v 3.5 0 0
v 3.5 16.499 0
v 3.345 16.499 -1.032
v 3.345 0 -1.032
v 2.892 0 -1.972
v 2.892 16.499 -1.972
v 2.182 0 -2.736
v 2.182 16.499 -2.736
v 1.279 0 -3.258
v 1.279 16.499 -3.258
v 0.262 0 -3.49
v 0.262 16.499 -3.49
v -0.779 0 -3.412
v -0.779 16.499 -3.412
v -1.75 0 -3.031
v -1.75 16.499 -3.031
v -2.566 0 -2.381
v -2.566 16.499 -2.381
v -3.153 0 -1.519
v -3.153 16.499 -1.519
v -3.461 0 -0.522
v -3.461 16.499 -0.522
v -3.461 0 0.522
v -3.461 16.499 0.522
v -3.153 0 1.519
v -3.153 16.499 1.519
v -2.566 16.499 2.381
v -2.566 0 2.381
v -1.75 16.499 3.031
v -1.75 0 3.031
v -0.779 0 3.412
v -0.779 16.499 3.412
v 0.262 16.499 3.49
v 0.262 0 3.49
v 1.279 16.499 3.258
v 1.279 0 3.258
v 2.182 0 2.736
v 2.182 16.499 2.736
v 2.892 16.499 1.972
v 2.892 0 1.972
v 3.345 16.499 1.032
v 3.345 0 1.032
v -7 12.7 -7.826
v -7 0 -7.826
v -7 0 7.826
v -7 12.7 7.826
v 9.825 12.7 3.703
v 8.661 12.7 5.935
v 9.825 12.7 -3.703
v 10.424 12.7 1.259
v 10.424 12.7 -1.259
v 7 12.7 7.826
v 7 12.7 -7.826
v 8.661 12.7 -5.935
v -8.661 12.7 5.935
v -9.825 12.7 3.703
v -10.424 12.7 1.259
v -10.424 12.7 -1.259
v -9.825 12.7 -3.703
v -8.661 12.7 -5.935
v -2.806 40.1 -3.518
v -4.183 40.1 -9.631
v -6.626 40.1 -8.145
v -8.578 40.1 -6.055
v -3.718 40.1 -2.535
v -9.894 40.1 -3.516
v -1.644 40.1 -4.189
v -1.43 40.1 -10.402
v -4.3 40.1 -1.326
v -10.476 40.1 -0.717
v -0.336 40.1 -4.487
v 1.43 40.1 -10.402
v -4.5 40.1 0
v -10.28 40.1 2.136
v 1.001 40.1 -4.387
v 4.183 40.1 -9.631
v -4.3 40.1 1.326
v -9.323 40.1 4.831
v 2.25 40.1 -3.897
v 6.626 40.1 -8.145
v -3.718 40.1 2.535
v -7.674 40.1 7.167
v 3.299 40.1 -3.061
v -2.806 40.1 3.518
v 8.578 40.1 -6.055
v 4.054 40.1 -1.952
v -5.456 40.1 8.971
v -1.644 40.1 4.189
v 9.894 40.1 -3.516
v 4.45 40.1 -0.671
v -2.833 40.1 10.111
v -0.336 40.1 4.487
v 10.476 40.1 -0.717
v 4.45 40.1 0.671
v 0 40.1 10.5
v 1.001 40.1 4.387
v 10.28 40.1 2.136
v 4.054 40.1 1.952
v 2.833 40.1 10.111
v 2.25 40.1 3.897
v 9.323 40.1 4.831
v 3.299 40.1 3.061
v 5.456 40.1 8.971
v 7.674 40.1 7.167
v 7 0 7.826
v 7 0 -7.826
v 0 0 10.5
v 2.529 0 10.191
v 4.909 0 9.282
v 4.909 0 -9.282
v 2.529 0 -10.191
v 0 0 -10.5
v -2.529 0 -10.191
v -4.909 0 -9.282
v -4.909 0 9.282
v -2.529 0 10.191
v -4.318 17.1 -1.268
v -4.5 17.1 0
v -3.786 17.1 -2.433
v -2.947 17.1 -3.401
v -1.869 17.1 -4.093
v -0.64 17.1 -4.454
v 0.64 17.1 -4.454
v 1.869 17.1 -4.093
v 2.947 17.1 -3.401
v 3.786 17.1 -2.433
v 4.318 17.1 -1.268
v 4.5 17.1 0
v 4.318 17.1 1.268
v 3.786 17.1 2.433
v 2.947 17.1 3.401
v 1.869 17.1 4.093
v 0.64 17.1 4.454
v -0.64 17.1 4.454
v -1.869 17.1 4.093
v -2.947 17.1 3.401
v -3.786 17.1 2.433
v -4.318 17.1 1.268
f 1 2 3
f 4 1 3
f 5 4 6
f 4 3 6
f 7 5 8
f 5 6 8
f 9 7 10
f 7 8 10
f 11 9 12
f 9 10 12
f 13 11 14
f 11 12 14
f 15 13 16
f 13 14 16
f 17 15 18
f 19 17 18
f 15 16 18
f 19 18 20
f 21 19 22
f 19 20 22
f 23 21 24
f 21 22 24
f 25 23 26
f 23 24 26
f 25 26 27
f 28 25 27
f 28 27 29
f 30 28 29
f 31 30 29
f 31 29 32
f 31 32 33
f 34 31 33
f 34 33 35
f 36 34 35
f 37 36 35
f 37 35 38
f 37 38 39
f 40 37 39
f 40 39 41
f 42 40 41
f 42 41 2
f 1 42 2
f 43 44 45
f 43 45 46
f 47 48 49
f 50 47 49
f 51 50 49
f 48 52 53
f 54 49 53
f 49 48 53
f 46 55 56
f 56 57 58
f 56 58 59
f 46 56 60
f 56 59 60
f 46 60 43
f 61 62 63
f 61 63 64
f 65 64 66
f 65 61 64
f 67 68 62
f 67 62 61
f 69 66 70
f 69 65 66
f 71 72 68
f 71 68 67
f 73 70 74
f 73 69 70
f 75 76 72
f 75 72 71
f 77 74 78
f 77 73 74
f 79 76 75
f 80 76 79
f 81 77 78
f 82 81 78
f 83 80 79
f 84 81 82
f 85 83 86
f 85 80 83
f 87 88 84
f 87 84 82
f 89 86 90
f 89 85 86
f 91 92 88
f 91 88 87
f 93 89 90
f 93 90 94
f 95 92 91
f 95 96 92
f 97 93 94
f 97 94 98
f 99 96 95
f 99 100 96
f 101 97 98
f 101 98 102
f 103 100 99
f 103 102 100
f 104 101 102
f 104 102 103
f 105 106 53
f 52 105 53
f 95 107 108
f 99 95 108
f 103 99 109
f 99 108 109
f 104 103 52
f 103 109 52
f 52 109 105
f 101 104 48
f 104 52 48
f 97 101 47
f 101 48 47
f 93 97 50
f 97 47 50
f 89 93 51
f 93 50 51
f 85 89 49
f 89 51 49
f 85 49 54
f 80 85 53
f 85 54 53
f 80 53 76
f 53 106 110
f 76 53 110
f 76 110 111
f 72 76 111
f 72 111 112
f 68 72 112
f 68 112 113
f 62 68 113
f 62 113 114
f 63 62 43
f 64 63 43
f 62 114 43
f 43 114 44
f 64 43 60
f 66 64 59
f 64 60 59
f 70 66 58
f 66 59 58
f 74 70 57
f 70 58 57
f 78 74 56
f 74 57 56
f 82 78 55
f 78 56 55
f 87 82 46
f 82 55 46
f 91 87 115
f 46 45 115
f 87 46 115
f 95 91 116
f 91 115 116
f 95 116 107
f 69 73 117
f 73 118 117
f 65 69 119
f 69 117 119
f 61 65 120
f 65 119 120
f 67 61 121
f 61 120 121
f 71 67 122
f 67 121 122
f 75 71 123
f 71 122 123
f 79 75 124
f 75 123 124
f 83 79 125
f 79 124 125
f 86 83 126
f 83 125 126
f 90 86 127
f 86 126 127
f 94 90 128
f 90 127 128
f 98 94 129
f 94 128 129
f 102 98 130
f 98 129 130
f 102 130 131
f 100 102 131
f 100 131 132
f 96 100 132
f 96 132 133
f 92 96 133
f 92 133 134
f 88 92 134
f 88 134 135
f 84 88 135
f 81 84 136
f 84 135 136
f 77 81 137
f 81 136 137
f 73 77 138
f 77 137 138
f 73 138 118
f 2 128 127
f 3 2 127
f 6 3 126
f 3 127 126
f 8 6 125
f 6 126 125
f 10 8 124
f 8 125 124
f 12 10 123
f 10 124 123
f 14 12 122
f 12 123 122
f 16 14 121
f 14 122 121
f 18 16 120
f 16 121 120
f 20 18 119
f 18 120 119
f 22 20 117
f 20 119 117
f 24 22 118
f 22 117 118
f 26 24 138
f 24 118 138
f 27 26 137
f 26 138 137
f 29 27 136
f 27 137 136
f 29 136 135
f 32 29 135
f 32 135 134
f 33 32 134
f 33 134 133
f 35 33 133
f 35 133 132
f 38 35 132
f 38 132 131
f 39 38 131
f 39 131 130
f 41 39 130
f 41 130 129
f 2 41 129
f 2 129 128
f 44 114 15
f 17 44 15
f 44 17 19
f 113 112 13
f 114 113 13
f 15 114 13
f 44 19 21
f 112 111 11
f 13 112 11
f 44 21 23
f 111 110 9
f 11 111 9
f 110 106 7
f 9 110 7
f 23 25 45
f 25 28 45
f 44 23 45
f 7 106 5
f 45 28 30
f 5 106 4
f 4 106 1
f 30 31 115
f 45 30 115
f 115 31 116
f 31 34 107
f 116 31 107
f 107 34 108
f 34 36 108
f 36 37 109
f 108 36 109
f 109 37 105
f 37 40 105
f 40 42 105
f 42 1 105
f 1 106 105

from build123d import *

# Parameters (mm, degrees)
SKETCH1_R                  = 10.5
BOSS_EXTRUDE1_DEPTH        = 40.1
M10X1_0_TAPPED_HOLE1_D     = 9
M10X1_0_TAPPED_HOLE1_DEPTH = 23
M10X1_0_TAPPED_HOLE1_TIP   = 2.703872786
M8X1_0_TAPPED_HOLE1_D      = 7
M8X1_0_TAPPED_HOLE1_DEPTH  = 19
M8X1_0_TAPPED_HOLE1_TIP    = 2.103012167
CUT_EXTRUDE1_DEPTH         = 43.761080435
CUT_EXTRUDE1_DEPTH_BACK    = 43.761080435
SKETCH6_W                  = 3.5
SKETCH6_H                  = 12.7


with BuildPart() as part:
    # Sketch1 → Boss-Extrude1 (new body)
    with BuildSketch(Plane(origin=(0, 0, 0), x_dir=(1, 0, 0), z_dir=(0, 1, 0))):
        with Locations(Location((0, 0, 0), (0, 0, 270))):
            Circle(SKETCH1_R)
    extrude(amount=BOSS_EXTRUDE1_DEPTH)

    # M10x1.0 Tapped Hole1
    with Locations(Plane(origin=(0, 40.1, 0), x_dir=(1, 0, 0), z_dir=(0, 1, 0))):
        with Locations((0, 0)):
            Hole(M10X1_0_TAPPED_HOLE1_D / 2, depth=M10X1_0_TAPPED_HOLE1_DEPTH)
            with Locations((0, 0, -(M10X1_0_TAPPED_HOLE1_DEPTH + M10X1_0_TAPPED_HOLE1_TIP / 2))):  # 118° drill point
                Cone(0, M10X1_0_TAPPED_HOLE1_D / 2, M10X1_0_TAPPED_HOLE1_TIP, mode=Mode.SUBTRACT)

    # M8x1.0 Tapped Hole1
    with Locations(Plane(origin=(0, 0, 0), x_dir=(-1, 0, 0), z_dir=(0, -1, 0))):
        with Locations((0, 0)):
            Hole(M8X1_0_TAPPED_HOLE1_D / 2, depth=M8X1_0_TAPPED_HOLE1_DEPTH)
            with Locations((0, 0, -(M8X1_0_TAPPED_HOLE1_DEPTH + M8X1_0_TAPPED_HOLE1_TIP / 2))):  # 118° drill point
                Cone(0, M8X1_0_TAPPED_HOLE1_D / 2, M8X1_0_TAPPED_HOLE1_TIP, mode=Mode.SUBTRACT)

    # Sketch6 → Cut-Extrude1 (cut, two sides: drawn at the far end of the back side and taken through both)
    with BuildSketch(Plane.XY.offset(-CUT_EXTRUDE1_DEPTH_BACK)):
        with Locations((-8.75, 6.35)):
            Rectangle(SKETCH6_W, SKETCH6_H)
        with Locations((8.75, 6.35)):
            Rectangle(SKETCH6_W, SKETCH6_H)
    extrude(amount=CUT_EXTRUDE1_DEPTH + CUT_EXTRUDE1_DEPTH_BACK, mode=Mode.SUBTRACT)


solid = part.part
